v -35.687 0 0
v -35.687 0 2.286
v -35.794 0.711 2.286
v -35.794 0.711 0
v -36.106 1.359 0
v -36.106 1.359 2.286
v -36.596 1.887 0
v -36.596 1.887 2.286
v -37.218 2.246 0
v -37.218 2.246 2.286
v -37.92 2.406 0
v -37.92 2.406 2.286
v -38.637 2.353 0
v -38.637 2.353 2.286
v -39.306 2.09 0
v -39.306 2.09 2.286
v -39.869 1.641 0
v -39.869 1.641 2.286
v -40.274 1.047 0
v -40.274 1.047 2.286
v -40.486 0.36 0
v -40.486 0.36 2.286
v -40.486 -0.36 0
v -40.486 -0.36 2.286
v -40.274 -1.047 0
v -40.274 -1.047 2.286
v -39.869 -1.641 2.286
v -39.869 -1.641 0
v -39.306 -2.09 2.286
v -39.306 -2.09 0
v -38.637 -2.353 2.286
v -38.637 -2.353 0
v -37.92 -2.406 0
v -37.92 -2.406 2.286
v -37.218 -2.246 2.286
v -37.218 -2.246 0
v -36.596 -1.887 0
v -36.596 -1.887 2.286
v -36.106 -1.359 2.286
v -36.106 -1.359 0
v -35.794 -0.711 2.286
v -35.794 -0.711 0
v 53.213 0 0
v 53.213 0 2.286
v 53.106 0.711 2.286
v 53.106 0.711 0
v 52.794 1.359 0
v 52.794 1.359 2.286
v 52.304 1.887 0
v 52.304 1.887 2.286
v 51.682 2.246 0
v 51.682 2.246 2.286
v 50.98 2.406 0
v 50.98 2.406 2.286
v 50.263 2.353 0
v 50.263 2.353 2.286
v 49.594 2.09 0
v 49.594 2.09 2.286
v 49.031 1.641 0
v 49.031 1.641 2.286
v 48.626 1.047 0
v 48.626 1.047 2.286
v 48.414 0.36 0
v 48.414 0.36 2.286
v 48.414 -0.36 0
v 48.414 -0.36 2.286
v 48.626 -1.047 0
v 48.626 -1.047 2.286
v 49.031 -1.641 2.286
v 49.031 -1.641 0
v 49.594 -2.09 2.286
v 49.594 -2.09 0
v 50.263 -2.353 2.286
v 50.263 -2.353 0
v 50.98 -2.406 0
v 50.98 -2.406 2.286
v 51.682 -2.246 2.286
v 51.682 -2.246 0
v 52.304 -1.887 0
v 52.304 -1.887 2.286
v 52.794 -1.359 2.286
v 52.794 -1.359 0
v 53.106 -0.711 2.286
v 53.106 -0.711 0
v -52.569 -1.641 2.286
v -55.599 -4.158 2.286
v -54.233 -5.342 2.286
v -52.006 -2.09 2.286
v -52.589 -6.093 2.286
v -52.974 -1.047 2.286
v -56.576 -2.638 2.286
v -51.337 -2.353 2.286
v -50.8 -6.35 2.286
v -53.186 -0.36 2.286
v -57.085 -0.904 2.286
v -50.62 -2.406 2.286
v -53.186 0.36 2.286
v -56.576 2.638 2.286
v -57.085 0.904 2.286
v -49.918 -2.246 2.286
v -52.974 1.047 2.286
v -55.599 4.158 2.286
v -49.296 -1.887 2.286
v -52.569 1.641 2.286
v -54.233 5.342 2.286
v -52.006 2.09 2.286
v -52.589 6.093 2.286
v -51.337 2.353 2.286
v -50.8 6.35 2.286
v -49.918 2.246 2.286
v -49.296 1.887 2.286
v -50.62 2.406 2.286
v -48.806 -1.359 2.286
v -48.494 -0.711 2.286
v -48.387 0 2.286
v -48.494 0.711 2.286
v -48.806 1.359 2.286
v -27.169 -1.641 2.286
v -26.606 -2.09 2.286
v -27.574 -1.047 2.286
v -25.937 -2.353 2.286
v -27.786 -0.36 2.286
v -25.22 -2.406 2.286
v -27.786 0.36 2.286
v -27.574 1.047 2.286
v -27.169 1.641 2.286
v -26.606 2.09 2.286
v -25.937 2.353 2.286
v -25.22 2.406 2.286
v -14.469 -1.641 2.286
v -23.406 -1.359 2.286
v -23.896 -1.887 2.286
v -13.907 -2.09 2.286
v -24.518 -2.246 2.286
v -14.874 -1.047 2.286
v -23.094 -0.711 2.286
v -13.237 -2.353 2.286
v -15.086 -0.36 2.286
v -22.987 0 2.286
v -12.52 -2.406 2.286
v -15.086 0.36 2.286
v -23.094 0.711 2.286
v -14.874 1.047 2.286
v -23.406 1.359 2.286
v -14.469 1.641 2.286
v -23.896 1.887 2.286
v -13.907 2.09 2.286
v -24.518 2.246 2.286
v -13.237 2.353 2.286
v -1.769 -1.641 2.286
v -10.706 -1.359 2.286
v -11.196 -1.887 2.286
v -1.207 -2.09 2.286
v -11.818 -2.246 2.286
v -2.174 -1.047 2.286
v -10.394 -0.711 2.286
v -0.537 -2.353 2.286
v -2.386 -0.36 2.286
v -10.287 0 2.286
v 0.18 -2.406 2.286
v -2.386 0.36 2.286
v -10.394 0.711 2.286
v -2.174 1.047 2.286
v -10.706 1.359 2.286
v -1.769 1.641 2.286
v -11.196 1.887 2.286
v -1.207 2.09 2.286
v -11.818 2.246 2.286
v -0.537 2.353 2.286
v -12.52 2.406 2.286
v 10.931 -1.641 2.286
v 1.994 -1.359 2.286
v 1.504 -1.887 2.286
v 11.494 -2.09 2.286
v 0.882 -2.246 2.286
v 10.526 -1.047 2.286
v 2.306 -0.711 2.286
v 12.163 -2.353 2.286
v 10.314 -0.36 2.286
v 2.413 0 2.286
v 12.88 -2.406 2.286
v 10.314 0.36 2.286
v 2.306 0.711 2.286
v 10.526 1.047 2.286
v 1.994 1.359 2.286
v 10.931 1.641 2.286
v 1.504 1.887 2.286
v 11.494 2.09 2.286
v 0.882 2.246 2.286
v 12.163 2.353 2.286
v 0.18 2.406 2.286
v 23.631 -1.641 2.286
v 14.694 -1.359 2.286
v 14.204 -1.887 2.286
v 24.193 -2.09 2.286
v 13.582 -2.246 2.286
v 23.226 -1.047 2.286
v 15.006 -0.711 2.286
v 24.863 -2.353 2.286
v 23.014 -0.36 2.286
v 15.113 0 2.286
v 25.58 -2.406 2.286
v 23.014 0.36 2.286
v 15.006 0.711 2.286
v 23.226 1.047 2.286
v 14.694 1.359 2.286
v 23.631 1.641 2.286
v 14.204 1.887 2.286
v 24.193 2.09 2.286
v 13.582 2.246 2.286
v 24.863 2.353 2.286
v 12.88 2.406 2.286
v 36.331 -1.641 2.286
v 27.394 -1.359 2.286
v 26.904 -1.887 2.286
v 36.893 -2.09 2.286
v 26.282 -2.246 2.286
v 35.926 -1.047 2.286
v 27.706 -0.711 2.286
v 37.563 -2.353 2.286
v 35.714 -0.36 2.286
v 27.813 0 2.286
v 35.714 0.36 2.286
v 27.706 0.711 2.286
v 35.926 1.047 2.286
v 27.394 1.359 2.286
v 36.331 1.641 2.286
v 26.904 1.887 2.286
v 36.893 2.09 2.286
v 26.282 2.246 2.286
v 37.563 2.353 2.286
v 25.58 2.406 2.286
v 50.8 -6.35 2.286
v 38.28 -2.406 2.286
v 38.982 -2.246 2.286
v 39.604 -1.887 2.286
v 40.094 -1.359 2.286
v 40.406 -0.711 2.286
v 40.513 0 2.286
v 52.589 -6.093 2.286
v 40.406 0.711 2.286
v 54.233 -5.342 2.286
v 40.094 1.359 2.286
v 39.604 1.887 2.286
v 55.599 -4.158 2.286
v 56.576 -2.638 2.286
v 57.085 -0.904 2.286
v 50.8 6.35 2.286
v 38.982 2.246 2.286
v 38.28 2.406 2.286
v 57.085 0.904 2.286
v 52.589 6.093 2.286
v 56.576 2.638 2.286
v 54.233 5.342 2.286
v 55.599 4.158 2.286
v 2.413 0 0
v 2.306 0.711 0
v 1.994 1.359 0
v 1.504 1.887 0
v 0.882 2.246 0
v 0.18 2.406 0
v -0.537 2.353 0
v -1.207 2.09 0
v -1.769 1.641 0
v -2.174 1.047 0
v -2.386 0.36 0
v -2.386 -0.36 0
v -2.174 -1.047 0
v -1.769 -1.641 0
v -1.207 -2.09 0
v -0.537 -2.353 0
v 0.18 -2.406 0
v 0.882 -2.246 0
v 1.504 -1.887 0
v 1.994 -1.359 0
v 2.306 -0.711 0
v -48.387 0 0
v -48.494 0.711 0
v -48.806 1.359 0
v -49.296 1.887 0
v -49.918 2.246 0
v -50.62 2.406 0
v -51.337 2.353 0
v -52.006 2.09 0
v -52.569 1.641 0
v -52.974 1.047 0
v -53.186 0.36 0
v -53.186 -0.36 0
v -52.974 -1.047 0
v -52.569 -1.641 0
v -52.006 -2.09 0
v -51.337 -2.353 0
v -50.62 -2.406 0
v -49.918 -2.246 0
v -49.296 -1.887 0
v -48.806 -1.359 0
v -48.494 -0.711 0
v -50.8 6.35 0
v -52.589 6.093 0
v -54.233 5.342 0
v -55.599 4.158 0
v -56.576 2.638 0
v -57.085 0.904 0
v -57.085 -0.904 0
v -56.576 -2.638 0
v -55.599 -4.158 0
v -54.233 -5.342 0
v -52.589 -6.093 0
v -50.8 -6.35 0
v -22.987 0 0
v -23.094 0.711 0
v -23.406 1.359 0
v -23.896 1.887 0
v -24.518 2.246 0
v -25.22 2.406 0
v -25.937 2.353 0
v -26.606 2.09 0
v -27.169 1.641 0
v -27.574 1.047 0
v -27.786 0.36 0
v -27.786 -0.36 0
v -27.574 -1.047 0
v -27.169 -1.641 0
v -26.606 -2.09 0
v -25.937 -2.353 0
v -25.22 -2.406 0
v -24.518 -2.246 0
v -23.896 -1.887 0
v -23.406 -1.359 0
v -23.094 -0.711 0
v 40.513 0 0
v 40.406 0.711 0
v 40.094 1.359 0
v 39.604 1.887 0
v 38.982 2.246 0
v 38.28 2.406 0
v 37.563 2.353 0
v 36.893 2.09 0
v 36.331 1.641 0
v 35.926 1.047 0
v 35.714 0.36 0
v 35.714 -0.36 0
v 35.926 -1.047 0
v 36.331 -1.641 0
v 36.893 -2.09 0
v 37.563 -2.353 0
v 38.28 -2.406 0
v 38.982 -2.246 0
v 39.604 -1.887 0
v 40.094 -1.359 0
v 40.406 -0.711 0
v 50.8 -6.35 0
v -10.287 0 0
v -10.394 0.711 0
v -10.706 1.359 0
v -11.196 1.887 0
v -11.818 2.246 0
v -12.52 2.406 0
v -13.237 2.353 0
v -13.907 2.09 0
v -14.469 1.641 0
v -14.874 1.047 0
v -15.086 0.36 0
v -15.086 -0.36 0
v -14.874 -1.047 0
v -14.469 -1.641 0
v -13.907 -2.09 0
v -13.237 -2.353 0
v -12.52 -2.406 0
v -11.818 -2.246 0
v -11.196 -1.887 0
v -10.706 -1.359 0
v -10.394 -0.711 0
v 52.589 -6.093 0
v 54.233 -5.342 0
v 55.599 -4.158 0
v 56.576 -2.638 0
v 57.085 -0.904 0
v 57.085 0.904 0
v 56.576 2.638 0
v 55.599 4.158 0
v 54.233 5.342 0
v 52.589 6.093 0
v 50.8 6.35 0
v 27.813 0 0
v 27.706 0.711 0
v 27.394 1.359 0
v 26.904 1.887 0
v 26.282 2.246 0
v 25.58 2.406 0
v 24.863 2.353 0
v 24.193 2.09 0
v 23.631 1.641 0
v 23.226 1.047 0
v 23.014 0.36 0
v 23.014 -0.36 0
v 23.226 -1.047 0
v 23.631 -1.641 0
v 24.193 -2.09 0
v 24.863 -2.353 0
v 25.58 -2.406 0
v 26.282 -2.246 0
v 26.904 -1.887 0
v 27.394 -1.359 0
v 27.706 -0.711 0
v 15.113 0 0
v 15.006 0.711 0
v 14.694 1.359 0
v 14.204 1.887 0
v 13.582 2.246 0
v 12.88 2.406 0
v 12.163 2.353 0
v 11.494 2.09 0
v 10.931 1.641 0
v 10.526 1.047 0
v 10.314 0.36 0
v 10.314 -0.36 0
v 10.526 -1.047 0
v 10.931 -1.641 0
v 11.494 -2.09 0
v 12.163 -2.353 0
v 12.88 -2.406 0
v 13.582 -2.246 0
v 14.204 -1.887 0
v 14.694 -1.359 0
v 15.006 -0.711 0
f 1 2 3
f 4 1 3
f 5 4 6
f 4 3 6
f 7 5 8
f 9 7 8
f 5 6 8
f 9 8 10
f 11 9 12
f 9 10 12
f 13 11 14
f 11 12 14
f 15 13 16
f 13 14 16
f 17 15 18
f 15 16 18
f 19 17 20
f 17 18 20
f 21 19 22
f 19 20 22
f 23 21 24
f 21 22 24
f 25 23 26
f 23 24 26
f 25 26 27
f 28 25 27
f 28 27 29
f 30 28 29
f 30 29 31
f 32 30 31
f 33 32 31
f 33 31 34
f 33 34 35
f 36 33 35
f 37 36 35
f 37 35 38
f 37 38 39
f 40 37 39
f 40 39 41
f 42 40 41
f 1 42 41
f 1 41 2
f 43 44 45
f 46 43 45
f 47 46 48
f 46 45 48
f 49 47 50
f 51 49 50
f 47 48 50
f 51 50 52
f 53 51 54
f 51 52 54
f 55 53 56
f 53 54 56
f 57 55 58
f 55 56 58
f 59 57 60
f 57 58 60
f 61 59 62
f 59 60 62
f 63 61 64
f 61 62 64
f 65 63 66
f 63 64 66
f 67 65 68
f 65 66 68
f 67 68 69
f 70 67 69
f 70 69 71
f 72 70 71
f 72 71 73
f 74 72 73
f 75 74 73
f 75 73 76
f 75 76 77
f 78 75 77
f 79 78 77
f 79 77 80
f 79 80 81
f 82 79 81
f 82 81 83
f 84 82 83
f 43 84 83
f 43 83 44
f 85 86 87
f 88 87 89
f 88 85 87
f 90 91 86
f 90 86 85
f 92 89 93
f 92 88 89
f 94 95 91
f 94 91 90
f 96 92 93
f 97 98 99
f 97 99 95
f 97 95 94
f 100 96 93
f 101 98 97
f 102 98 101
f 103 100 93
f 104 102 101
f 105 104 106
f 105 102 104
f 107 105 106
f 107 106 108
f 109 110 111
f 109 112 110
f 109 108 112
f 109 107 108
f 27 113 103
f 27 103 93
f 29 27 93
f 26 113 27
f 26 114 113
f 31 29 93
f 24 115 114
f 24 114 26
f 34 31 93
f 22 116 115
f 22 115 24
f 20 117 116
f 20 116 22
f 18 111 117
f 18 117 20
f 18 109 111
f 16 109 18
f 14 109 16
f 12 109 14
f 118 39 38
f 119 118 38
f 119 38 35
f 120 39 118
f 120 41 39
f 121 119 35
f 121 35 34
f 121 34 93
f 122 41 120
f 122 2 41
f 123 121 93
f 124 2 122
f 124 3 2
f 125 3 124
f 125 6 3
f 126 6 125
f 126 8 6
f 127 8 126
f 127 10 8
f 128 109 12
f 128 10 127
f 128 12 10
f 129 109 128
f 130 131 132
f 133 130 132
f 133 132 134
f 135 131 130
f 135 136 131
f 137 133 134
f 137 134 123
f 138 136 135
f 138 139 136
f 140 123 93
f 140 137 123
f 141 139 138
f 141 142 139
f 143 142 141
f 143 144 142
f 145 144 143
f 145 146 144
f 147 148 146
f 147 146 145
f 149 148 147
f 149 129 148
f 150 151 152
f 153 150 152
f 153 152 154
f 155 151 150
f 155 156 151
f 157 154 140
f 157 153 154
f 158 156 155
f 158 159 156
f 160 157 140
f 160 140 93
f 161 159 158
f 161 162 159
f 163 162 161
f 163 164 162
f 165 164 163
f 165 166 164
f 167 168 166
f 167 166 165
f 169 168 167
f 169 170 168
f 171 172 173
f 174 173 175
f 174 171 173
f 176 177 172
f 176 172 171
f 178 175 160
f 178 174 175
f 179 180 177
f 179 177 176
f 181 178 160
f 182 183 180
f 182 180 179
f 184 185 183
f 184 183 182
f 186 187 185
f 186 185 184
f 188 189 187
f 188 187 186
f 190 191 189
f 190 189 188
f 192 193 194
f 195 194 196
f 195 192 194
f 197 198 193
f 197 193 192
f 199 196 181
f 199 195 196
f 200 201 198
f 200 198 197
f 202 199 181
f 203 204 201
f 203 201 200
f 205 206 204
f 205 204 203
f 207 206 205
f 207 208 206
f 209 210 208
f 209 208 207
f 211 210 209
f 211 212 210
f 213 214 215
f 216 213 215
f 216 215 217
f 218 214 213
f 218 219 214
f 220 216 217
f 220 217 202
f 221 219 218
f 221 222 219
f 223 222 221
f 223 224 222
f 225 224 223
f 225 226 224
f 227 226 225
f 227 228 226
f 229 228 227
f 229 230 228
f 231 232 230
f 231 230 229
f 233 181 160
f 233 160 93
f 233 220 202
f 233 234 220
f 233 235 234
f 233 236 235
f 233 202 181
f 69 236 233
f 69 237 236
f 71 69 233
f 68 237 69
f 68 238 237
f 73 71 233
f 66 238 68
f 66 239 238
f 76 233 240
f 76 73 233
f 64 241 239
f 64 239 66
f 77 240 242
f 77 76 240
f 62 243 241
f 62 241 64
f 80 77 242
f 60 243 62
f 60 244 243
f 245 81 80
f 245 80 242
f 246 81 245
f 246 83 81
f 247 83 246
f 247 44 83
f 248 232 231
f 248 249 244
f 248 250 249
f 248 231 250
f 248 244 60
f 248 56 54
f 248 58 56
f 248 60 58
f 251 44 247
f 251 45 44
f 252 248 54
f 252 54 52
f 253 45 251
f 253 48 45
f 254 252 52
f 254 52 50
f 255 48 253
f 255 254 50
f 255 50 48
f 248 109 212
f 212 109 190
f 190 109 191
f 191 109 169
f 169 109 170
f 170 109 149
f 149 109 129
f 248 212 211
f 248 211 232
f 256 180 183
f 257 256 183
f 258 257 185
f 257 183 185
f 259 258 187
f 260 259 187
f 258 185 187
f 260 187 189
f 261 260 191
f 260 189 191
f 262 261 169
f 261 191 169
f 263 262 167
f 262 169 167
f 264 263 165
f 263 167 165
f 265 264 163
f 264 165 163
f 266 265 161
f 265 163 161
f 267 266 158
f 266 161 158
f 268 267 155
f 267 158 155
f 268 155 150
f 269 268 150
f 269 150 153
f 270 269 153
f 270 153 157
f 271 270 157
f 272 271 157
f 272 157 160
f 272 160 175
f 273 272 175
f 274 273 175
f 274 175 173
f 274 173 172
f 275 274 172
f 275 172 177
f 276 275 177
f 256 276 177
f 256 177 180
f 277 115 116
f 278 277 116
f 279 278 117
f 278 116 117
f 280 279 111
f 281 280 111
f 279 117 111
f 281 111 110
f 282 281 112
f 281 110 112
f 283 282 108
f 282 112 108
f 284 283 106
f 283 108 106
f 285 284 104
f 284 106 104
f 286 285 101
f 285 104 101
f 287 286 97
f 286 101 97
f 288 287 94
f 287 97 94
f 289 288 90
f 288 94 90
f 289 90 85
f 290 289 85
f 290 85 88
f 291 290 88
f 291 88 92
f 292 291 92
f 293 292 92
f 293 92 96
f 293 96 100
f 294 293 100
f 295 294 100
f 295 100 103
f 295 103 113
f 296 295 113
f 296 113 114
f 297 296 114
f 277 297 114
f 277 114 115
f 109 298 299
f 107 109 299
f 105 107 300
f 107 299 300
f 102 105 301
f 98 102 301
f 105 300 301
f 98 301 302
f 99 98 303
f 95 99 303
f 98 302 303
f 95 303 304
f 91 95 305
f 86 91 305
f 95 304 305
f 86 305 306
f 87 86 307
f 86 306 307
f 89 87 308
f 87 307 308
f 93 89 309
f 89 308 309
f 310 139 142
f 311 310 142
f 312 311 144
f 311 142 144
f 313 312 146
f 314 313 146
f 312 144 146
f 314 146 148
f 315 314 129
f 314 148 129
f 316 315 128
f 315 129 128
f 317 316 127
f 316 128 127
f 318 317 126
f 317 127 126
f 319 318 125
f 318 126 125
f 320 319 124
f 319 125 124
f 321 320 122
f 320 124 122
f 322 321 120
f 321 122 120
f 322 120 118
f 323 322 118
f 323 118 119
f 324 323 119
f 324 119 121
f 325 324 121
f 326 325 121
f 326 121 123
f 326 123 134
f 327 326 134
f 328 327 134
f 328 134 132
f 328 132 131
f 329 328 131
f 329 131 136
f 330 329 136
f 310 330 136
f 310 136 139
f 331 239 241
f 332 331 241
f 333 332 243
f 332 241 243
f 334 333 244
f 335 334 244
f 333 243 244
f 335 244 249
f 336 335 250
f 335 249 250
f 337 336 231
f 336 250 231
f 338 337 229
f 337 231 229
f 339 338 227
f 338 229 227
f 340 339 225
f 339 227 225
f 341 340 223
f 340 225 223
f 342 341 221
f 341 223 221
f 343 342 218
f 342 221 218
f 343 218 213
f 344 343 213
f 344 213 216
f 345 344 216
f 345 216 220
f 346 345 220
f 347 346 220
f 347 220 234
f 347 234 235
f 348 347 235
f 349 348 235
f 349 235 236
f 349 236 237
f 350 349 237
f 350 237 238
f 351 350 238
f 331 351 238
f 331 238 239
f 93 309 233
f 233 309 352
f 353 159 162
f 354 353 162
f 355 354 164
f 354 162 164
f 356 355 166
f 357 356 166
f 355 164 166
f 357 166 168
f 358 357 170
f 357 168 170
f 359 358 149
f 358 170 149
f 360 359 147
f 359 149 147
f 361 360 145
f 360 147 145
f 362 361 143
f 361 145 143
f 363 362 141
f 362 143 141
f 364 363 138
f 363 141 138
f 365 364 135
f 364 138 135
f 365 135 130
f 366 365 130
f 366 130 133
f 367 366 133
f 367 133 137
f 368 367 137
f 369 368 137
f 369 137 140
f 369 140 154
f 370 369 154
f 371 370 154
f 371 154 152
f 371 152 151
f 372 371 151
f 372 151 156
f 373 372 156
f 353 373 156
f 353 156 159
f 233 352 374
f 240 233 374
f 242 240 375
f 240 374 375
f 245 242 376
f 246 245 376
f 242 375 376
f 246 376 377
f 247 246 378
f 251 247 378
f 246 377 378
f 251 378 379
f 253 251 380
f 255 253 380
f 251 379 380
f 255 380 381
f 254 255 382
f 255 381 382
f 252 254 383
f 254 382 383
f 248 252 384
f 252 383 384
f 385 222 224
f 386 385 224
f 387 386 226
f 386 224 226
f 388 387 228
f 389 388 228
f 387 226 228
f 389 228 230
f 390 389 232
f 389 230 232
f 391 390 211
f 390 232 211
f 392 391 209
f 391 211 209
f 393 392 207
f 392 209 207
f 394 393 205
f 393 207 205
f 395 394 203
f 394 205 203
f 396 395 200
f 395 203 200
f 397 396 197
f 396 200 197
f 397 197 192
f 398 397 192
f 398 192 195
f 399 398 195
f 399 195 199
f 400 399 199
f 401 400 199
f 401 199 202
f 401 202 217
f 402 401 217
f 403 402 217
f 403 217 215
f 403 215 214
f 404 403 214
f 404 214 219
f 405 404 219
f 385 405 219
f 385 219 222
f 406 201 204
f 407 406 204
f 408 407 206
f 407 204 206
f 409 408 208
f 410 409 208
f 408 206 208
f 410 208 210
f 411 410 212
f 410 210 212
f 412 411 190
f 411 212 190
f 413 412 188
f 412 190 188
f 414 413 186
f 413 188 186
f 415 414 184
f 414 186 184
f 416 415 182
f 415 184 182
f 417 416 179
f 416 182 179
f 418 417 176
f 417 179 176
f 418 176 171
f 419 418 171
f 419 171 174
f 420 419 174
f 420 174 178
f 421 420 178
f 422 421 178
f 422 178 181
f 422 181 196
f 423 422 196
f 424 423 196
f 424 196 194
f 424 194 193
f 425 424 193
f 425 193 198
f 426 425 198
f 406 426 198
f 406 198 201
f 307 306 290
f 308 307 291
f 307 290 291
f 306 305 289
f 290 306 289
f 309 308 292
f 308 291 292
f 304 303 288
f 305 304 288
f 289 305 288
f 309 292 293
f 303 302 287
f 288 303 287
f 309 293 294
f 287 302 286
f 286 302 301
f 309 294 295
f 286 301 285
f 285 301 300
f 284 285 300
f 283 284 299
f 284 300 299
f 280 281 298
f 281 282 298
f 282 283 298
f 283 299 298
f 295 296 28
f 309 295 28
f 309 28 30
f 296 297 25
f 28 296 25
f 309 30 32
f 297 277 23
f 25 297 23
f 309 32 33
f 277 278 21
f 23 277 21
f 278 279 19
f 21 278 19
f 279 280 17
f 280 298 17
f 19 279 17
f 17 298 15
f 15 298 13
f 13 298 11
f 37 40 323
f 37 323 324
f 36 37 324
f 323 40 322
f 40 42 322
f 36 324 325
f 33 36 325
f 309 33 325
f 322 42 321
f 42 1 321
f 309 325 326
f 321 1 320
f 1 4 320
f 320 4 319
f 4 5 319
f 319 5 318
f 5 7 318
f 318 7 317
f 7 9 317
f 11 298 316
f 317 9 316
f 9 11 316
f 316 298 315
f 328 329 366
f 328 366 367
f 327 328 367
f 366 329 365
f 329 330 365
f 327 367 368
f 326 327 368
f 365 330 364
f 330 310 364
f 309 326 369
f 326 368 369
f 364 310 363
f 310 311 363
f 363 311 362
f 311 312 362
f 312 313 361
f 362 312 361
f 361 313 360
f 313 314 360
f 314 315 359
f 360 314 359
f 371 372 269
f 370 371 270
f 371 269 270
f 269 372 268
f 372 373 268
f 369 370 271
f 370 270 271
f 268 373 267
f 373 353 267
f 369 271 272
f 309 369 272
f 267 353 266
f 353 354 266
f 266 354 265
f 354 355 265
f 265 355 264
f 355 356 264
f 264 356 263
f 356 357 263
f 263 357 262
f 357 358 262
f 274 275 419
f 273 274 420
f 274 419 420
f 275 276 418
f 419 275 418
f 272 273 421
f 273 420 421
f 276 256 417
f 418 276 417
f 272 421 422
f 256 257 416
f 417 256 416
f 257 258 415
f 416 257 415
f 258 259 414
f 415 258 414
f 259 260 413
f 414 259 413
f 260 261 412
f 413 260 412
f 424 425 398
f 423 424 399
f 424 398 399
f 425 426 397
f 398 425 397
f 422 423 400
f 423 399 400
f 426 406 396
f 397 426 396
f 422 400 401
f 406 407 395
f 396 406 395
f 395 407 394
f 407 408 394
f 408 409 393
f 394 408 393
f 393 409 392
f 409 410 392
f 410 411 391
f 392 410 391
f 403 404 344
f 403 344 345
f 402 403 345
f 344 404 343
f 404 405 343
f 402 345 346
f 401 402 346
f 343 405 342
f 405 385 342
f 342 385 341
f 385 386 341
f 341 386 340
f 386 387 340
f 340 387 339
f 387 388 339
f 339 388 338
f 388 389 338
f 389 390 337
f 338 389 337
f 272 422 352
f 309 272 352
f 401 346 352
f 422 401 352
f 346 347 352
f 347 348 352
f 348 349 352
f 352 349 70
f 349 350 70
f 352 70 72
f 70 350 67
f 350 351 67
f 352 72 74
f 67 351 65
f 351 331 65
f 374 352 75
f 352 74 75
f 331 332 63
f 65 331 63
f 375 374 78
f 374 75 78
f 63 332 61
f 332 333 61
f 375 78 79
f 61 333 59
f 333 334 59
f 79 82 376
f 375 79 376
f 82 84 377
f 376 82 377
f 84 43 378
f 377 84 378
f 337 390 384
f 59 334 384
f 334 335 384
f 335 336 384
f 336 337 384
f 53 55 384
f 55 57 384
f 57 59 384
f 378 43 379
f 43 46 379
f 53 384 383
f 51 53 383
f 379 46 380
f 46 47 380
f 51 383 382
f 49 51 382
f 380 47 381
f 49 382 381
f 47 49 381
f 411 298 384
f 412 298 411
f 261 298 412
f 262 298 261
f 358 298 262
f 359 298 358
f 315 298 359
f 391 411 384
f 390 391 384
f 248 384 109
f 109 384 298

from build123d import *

# Parameters (mm, degrees)
EXTRUDE1_DEPTH     = 2.286
SKETCH2_R          = 2.413
CUT_EXTRUDE1_DEPTH = 3.286
LPATTERN1_COUNT    = 9
LPATTERN1_PITCH    = 12.7


with BuildPart() as part:
    # Sketch1 → Extrude1 (new body)
    with BuildSketch(Plane.XY):
        with BuildLine():
            Line((-50.8, -6.35), (50.8, -6.35))
            ThreePointArc((50.8, -6.35), (57.15, 0), (50.8, 6.35))
            Line((50.8, 6.35), (-50.8, 6.35))
            ThreePointArc((-50.8, 6.35), (-57.15, 0), (-50.8, -6.35))
        make_face()
    extrude(amount=EXTRUDE1_DEPTH)

    # Sketch2 → Cut-Extrude1 (cut, through all)
    with BuildSketch(Plane.XY.offset(2.286)):
        with Locations((-50.8, 0)):
            Circle(SKETCH2_R)
    cut_extrude1 = extrude(amount=-CUT_EXTRUDE1_DEPTH, mode=Mode.SUBTRACT)

    # LPattern1: Cut-Extrude1 ×9
    with Locations(*[(i * LPATTERN1_PITCH, 0, 0) for i in range(1, LPATTERN1_COUNT)]):
        add(cut_extrude1, mode=Mode.SUBTRACT)


solid = part.part
